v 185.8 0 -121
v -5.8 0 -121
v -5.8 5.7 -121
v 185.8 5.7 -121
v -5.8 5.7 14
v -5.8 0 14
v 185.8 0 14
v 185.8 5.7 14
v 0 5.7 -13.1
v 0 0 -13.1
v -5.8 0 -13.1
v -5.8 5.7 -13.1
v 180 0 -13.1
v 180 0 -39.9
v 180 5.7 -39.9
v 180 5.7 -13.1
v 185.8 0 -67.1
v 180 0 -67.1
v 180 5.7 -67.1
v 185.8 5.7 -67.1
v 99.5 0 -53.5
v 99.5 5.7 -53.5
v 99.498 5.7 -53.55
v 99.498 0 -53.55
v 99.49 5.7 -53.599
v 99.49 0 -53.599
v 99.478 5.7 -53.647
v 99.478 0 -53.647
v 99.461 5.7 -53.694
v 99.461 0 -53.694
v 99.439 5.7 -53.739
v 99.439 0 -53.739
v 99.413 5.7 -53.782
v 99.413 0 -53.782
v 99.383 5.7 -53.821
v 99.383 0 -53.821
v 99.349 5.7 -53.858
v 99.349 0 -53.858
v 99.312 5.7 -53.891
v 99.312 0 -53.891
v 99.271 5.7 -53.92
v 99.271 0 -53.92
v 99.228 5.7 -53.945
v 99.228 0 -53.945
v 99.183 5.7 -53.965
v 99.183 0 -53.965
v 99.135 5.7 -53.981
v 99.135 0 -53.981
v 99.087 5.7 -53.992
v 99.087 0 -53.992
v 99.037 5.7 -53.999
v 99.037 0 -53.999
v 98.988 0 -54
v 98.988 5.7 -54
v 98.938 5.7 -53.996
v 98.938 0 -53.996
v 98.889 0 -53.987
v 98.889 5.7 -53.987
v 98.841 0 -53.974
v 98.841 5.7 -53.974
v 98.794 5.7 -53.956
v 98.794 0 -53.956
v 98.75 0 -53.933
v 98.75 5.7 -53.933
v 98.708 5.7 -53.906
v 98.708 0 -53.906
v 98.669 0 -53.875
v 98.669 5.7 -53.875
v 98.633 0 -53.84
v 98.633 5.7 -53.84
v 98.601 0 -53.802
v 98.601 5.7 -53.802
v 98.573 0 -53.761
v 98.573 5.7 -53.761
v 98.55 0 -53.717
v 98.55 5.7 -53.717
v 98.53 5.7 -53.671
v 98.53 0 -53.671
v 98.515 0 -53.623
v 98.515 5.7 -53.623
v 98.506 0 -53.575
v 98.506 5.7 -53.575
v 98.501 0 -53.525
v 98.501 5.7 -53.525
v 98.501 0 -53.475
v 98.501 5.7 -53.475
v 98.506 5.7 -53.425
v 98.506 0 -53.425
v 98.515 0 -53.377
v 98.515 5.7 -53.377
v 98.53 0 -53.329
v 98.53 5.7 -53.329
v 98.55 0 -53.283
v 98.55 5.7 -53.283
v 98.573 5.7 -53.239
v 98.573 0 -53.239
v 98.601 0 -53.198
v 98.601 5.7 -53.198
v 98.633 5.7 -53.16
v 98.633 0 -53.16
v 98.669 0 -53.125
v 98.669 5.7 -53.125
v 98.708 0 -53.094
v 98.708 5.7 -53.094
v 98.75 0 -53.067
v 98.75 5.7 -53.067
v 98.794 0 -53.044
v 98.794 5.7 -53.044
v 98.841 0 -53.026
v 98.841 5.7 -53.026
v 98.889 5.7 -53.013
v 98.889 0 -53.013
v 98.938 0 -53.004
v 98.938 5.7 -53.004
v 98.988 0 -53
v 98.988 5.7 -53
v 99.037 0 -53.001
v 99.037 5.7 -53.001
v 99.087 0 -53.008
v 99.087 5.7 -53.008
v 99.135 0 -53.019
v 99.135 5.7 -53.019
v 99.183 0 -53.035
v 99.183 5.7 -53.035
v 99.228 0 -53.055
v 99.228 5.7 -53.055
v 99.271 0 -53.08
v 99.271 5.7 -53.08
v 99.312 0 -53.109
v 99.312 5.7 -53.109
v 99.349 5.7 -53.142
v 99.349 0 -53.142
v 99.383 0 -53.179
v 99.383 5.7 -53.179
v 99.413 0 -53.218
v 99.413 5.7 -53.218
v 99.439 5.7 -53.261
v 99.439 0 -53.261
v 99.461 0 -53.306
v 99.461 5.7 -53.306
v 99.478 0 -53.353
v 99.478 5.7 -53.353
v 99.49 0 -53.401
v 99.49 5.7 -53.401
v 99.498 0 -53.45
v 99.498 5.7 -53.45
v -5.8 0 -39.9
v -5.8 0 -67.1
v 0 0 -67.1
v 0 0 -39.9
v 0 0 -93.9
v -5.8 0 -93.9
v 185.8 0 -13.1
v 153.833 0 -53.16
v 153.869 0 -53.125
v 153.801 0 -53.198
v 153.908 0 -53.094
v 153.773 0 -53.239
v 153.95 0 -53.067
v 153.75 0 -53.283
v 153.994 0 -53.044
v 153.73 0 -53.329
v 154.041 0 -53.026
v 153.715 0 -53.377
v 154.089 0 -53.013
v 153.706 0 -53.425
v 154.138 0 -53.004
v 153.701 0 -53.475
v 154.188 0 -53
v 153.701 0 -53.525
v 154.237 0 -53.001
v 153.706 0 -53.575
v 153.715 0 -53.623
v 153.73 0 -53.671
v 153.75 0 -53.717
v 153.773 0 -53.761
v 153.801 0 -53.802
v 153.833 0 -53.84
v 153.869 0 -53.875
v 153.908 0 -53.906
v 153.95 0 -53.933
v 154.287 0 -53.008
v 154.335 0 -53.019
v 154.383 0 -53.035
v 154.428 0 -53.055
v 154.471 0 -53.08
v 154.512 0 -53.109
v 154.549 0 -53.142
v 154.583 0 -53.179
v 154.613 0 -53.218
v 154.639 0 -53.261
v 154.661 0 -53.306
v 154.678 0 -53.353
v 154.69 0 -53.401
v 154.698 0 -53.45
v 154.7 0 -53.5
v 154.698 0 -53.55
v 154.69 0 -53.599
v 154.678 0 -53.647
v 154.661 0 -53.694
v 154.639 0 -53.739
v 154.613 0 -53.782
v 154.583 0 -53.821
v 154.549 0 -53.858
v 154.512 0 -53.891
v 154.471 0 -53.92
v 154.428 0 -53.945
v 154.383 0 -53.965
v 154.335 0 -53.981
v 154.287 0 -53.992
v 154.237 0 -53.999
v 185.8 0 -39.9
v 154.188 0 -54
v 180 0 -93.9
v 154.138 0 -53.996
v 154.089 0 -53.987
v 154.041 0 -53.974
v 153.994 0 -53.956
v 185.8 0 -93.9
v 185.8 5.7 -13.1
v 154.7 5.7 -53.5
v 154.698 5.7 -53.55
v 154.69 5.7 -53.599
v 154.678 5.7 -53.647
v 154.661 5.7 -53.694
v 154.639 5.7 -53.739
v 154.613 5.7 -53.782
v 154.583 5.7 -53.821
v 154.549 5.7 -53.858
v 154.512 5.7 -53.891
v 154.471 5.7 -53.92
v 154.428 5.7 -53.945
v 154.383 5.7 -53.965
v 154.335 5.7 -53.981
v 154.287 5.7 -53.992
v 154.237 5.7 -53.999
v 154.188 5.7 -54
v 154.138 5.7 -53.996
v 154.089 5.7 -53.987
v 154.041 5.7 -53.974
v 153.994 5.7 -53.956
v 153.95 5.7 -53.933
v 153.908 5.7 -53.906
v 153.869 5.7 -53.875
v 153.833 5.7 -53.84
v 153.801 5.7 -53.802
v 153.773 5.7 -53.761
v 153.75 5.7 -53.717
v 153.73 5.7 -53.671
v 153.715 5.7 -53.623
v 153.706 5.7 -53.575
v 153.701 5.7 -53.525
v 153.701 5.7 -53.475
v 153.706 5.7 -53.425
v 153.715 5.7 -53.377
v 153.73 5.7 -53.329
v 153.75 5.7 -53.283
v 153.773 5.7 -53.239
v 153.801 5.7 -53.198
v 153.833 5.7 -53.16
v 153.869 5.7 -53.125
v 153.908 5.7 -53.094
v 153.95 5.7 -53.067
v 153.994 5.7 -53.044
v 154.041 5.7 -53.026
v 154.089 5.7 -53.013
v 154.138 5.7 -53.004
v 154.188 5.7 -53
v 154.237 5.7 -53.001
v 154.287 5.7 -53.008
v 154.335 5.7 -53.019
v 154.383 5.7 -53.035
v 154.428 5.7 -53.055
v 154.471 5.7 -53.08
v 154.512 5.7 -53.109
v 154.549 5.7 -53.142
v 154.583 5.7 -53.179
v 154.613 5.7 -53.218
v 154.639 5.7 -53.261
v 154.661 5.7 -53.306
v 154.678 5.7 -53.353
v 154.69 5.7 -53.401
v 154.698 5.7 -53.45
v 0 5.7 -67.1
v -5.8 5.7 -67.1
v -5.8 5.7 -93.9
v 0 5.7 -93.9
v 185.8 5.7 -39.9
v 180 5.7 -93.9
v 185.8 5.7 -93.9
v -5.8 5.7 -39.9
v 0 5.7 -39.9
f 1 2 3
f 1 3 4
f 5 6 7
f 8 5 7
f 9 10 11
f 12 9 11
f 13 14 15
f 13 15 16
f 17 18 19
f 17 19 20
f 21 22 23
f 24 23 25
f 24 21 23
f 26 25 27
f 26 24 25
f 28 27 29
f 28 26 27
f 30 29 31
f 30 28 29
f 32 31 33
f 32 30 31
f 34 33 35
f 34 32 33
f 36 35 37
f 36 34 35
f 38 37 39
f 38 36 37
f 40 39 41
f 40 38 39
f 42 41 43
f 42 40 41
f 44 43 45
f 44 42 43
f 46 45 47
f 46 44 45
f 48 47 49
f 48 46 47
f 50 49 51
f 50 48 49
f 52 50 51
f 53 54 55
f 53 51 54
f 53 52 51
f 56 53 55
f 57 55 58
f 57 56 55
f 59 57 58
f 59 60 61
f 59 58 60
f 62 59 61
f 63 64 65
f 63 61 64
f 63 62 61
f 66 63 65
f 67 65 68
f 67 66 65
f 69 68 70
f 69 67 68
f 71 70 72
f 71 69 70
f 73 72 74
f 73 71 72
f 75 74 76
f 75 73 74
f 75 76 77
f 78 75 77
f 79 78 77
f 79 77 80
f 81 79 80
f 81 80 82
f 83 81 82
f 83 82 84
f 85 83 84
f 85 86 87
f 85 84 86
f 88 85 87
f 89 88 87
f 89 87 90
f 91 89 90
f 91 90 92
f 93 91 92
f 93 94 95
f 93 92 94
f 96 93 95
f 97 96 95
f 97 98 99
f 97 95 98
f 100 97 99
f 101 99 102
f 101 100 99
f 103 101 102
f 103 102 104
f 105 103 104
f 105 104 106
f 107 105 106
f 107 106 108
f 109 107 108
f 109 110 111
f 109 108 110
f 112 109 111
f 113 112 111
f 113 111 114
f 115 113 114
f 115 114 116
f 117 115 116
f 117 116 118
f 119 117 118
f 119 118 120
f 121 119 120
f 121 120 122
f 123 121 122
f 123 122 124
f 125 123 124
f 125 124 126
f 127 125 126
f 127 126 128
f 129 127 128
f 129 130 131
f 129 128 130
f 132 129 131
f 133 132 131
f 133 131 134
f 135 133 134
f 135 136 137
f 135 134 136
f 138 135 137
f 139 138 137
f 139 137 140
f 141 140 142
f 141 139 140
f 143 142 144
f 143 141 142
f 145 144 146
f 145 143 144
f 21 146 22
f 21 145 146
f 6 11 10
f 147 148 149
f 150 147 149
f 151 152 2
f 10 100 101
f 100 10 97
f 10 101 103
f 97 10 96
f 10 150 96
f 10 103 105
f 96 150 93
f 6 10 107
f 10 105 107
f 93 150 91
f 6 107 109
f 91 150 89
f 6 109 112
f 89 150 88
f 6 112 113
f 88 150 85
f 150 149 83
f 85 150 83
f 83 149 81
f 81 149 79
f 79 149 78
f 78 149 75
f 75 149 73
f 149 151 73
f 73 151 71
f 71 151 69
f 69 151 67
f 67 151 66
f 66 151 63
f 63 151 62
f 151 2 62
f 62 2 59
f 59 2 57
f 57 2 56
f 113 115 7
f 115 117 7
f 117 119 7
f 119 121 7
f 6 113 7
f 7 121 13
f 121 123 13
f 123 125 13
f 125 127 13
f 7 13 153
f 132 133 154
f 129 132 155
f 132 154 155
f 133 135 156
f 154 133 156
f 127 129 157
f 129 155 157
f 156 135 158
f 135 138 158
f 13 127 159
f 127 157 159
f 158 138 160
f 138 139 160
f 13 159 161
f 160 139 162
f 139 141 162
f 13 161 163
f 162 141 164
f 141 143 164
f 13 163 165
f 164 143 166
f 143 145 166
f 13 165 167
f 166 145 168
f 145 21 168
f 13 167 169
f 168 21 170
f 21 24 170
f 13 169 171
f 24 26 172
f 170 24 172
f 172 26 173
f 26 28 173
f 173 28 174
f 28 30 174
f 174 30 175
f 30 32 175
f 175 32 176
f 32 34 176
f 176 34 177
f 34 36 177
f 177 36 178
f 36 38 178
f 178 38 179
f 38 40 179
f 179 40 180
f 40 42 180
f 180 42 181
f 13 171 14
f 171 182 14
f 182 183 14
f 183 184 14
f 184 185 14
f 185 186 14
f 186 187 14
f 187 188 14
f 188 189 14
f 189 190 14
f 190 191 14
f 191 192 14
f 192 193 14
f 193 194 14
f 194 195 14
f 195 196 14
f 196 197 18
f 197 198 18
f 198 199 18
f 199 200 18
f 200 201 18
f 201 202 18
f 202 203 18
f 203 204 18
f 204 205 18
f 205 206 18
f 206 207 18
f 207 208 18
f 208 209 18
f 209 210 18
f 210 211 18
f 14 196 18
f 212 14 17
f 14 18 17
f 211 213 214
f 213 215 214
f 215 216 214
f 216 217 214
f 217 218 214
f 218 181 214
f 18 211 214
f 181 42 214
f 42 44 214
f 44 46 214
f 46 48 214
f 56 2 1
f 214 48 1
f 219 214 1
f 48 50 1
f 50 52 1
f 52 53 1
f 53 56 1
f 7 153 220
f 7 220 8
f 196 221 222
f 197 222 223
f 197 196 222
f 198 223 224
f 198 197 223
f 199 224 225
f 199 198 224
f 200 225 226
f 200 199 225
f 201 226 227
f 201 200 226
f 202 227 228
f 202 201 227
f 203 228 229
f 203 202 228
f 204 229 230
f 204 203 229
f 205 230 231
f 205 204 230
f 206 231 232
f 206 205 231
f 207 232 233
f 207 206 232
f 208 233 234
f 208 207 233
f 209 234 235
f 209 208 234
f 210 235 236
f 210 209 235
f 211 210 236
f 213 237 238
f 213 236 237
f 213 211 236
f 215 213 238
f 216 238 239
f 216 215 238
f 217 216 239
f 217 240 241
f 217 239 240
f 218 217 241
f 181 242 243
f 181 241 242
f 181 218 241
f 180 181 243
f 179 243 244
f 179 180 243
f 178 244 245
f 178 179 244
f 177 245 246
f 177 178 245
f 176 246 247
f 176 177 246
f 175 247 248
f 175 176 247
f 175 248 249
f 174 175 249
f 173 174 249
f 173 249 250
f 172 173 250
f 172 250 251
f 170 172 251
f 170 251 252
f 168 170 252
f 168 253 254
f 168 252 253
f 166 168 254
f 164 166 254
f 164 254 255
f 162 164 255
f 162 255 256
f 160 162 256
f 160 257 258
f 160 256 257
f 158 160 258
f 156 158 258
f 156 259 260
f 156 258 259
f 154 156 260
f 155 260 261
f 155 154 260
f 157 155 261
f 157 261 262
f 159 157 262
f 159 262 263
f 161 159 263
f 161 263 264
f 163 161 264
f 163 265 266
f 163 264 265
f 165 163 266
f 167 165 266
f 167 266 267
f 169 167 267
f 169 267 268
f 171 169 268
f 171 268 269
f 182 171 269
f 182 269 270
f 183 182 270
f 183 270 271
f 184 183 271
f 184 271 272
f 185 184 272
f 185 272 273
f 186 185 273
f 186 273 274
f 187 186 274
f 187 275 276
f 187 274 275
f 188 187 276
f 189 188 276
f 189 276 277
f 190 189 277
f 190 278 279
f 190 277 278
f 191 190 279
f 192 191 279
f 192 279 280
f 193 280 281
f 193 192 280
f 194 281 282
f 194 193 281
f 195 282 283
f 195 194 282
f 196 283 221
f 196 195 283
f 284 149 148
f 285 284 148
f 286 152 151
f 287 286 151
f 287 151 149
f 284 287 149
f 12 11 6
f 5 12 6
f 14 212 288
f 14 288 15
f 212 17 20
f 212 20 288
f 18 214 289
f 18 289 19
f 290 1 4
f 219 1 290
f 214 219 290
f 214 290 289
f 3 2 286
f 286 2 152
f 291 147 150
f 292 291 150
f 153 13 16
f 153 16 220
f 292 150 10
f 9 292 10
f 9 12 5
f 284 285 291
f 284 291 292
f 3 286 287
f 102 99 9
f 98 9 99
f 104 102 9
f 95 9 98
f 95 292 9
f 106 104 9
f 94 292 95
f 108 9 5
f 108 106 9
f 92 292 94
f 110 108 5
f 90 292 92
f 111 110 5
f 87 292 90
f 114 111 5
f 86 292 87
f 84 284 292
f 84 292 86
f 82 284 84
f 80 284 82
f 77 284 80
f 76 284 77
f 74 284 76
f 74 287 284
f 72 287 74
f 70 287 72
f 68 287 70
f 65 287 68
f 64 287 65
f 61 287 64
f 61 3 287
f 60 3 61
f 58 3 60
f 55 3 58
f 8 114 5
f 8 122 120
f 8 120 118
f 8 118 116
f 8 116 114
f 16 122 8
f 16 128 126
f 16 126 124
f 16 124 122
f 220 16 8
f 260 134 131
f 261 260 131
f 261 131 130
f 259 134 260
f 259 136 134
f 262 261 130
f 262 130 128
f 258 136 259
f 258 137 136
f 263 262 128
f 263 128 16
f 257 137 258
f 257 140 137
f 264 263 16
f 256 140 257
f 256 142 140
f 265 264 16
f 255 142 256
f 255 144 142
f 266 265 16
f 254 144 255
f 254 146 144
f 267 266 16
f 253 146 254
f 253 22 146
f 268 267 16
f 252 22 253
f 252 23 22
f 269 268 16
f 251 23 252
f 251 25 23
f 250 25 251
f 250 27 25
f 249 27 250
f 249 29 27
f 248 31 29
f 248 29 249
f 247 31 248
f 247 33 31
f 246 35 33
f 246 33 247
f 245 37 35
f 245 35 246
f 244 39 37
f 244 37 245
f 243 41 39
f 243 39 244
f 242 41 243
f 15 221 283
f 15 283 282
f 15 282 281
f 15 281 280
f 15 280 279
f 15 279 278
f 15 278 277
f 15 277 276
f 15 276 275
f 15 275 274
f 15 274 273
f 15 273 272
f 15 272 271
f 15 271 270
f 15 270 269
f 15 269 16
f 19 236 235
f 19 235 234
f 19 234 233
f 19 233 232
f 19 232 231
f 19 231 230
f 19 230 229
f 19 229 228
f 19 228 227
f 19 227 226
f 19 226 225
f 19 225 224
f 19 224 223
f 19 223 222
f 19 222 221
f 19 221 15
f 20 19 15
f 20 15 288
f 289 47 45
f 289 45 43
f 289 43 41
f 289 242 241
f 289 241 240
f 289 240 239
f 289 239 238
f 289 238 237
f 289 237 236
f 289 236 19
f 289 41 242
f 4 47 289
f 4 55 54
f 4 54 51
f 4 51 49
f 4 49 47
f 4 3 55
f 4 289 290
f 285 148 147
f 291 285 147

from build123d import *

# Parameters (mm, degrees)
SKETCH3_W           = 192
SKETCH3_H           = 135
BOSS_EXTRUDE1_DEPTH = 5.7
SKETCH11_R          = 0.5
CUT_EXTRUDE2_DEPTH  = 33
CUT_EXTRUDE3_DEPTH  = 22


with BuildPart() as part:
    # Sketch3 → Boss-Extrude1 (new body)
    with BuildSketch(Plane(origin=(0, 0, 0), x_dir=(1, 0, 0), z_dir=(0, 1, 0))):
        with Locations((90, 53.5)):
            Rectangle(SKETCH3_W, SKETCH3_H)
    extrude(amount=BOSS_EXTRUDE1_DEPTH)

    # Sketch11 → Cut-Extrude2 (cut)
    with BuildSketch(Plane(origin=(0, 0, 0), x_dir=(1, 0, 0), z_dir=(0, 1, 0))):
        with Locations((99, 53.5)):
            Circle(SKETCH11_R)
        with Locations((154.2, 53.5)):
            Circle(SKETCH11_R)
    extrude(amount=CUT_EXTRUDE2_DEPTH, mode=Mode.SUBTRACT)

    # Sketch12 → Cut-Extrude3 (cut)
    with BuildSketch(Plane(origin=(0, 0, 0), x_dir=(1, 0, 0), z_dir=(0, 1, 0))):
        Polygon((-5.8, 121), (-5.8, 93.9), (0, 93.9), (0, 67.1), (-5.8, 67.1), (-5.8, 39.9), (0, 39.9), (0, 13.1), (-5.8, 13.1), (-5.8, -14), (-9.8, -14), (-9.8, 121), align=None)
        Polygon((189.8, 121), (185.8, 121), (185.8, 93.9), (180, 93.9), (180, 67.1), (185.8, 67.1), (185.8, 39.9), (180, 39.9), (180, 13.1), (185.8, 13.1), (185.8, -14), (189.8, -14), align=None)
    extrude(amount=CUT_EXTRUDE3_DEPTH, mode=Mode.SUBTRACT)


solid = part.part
